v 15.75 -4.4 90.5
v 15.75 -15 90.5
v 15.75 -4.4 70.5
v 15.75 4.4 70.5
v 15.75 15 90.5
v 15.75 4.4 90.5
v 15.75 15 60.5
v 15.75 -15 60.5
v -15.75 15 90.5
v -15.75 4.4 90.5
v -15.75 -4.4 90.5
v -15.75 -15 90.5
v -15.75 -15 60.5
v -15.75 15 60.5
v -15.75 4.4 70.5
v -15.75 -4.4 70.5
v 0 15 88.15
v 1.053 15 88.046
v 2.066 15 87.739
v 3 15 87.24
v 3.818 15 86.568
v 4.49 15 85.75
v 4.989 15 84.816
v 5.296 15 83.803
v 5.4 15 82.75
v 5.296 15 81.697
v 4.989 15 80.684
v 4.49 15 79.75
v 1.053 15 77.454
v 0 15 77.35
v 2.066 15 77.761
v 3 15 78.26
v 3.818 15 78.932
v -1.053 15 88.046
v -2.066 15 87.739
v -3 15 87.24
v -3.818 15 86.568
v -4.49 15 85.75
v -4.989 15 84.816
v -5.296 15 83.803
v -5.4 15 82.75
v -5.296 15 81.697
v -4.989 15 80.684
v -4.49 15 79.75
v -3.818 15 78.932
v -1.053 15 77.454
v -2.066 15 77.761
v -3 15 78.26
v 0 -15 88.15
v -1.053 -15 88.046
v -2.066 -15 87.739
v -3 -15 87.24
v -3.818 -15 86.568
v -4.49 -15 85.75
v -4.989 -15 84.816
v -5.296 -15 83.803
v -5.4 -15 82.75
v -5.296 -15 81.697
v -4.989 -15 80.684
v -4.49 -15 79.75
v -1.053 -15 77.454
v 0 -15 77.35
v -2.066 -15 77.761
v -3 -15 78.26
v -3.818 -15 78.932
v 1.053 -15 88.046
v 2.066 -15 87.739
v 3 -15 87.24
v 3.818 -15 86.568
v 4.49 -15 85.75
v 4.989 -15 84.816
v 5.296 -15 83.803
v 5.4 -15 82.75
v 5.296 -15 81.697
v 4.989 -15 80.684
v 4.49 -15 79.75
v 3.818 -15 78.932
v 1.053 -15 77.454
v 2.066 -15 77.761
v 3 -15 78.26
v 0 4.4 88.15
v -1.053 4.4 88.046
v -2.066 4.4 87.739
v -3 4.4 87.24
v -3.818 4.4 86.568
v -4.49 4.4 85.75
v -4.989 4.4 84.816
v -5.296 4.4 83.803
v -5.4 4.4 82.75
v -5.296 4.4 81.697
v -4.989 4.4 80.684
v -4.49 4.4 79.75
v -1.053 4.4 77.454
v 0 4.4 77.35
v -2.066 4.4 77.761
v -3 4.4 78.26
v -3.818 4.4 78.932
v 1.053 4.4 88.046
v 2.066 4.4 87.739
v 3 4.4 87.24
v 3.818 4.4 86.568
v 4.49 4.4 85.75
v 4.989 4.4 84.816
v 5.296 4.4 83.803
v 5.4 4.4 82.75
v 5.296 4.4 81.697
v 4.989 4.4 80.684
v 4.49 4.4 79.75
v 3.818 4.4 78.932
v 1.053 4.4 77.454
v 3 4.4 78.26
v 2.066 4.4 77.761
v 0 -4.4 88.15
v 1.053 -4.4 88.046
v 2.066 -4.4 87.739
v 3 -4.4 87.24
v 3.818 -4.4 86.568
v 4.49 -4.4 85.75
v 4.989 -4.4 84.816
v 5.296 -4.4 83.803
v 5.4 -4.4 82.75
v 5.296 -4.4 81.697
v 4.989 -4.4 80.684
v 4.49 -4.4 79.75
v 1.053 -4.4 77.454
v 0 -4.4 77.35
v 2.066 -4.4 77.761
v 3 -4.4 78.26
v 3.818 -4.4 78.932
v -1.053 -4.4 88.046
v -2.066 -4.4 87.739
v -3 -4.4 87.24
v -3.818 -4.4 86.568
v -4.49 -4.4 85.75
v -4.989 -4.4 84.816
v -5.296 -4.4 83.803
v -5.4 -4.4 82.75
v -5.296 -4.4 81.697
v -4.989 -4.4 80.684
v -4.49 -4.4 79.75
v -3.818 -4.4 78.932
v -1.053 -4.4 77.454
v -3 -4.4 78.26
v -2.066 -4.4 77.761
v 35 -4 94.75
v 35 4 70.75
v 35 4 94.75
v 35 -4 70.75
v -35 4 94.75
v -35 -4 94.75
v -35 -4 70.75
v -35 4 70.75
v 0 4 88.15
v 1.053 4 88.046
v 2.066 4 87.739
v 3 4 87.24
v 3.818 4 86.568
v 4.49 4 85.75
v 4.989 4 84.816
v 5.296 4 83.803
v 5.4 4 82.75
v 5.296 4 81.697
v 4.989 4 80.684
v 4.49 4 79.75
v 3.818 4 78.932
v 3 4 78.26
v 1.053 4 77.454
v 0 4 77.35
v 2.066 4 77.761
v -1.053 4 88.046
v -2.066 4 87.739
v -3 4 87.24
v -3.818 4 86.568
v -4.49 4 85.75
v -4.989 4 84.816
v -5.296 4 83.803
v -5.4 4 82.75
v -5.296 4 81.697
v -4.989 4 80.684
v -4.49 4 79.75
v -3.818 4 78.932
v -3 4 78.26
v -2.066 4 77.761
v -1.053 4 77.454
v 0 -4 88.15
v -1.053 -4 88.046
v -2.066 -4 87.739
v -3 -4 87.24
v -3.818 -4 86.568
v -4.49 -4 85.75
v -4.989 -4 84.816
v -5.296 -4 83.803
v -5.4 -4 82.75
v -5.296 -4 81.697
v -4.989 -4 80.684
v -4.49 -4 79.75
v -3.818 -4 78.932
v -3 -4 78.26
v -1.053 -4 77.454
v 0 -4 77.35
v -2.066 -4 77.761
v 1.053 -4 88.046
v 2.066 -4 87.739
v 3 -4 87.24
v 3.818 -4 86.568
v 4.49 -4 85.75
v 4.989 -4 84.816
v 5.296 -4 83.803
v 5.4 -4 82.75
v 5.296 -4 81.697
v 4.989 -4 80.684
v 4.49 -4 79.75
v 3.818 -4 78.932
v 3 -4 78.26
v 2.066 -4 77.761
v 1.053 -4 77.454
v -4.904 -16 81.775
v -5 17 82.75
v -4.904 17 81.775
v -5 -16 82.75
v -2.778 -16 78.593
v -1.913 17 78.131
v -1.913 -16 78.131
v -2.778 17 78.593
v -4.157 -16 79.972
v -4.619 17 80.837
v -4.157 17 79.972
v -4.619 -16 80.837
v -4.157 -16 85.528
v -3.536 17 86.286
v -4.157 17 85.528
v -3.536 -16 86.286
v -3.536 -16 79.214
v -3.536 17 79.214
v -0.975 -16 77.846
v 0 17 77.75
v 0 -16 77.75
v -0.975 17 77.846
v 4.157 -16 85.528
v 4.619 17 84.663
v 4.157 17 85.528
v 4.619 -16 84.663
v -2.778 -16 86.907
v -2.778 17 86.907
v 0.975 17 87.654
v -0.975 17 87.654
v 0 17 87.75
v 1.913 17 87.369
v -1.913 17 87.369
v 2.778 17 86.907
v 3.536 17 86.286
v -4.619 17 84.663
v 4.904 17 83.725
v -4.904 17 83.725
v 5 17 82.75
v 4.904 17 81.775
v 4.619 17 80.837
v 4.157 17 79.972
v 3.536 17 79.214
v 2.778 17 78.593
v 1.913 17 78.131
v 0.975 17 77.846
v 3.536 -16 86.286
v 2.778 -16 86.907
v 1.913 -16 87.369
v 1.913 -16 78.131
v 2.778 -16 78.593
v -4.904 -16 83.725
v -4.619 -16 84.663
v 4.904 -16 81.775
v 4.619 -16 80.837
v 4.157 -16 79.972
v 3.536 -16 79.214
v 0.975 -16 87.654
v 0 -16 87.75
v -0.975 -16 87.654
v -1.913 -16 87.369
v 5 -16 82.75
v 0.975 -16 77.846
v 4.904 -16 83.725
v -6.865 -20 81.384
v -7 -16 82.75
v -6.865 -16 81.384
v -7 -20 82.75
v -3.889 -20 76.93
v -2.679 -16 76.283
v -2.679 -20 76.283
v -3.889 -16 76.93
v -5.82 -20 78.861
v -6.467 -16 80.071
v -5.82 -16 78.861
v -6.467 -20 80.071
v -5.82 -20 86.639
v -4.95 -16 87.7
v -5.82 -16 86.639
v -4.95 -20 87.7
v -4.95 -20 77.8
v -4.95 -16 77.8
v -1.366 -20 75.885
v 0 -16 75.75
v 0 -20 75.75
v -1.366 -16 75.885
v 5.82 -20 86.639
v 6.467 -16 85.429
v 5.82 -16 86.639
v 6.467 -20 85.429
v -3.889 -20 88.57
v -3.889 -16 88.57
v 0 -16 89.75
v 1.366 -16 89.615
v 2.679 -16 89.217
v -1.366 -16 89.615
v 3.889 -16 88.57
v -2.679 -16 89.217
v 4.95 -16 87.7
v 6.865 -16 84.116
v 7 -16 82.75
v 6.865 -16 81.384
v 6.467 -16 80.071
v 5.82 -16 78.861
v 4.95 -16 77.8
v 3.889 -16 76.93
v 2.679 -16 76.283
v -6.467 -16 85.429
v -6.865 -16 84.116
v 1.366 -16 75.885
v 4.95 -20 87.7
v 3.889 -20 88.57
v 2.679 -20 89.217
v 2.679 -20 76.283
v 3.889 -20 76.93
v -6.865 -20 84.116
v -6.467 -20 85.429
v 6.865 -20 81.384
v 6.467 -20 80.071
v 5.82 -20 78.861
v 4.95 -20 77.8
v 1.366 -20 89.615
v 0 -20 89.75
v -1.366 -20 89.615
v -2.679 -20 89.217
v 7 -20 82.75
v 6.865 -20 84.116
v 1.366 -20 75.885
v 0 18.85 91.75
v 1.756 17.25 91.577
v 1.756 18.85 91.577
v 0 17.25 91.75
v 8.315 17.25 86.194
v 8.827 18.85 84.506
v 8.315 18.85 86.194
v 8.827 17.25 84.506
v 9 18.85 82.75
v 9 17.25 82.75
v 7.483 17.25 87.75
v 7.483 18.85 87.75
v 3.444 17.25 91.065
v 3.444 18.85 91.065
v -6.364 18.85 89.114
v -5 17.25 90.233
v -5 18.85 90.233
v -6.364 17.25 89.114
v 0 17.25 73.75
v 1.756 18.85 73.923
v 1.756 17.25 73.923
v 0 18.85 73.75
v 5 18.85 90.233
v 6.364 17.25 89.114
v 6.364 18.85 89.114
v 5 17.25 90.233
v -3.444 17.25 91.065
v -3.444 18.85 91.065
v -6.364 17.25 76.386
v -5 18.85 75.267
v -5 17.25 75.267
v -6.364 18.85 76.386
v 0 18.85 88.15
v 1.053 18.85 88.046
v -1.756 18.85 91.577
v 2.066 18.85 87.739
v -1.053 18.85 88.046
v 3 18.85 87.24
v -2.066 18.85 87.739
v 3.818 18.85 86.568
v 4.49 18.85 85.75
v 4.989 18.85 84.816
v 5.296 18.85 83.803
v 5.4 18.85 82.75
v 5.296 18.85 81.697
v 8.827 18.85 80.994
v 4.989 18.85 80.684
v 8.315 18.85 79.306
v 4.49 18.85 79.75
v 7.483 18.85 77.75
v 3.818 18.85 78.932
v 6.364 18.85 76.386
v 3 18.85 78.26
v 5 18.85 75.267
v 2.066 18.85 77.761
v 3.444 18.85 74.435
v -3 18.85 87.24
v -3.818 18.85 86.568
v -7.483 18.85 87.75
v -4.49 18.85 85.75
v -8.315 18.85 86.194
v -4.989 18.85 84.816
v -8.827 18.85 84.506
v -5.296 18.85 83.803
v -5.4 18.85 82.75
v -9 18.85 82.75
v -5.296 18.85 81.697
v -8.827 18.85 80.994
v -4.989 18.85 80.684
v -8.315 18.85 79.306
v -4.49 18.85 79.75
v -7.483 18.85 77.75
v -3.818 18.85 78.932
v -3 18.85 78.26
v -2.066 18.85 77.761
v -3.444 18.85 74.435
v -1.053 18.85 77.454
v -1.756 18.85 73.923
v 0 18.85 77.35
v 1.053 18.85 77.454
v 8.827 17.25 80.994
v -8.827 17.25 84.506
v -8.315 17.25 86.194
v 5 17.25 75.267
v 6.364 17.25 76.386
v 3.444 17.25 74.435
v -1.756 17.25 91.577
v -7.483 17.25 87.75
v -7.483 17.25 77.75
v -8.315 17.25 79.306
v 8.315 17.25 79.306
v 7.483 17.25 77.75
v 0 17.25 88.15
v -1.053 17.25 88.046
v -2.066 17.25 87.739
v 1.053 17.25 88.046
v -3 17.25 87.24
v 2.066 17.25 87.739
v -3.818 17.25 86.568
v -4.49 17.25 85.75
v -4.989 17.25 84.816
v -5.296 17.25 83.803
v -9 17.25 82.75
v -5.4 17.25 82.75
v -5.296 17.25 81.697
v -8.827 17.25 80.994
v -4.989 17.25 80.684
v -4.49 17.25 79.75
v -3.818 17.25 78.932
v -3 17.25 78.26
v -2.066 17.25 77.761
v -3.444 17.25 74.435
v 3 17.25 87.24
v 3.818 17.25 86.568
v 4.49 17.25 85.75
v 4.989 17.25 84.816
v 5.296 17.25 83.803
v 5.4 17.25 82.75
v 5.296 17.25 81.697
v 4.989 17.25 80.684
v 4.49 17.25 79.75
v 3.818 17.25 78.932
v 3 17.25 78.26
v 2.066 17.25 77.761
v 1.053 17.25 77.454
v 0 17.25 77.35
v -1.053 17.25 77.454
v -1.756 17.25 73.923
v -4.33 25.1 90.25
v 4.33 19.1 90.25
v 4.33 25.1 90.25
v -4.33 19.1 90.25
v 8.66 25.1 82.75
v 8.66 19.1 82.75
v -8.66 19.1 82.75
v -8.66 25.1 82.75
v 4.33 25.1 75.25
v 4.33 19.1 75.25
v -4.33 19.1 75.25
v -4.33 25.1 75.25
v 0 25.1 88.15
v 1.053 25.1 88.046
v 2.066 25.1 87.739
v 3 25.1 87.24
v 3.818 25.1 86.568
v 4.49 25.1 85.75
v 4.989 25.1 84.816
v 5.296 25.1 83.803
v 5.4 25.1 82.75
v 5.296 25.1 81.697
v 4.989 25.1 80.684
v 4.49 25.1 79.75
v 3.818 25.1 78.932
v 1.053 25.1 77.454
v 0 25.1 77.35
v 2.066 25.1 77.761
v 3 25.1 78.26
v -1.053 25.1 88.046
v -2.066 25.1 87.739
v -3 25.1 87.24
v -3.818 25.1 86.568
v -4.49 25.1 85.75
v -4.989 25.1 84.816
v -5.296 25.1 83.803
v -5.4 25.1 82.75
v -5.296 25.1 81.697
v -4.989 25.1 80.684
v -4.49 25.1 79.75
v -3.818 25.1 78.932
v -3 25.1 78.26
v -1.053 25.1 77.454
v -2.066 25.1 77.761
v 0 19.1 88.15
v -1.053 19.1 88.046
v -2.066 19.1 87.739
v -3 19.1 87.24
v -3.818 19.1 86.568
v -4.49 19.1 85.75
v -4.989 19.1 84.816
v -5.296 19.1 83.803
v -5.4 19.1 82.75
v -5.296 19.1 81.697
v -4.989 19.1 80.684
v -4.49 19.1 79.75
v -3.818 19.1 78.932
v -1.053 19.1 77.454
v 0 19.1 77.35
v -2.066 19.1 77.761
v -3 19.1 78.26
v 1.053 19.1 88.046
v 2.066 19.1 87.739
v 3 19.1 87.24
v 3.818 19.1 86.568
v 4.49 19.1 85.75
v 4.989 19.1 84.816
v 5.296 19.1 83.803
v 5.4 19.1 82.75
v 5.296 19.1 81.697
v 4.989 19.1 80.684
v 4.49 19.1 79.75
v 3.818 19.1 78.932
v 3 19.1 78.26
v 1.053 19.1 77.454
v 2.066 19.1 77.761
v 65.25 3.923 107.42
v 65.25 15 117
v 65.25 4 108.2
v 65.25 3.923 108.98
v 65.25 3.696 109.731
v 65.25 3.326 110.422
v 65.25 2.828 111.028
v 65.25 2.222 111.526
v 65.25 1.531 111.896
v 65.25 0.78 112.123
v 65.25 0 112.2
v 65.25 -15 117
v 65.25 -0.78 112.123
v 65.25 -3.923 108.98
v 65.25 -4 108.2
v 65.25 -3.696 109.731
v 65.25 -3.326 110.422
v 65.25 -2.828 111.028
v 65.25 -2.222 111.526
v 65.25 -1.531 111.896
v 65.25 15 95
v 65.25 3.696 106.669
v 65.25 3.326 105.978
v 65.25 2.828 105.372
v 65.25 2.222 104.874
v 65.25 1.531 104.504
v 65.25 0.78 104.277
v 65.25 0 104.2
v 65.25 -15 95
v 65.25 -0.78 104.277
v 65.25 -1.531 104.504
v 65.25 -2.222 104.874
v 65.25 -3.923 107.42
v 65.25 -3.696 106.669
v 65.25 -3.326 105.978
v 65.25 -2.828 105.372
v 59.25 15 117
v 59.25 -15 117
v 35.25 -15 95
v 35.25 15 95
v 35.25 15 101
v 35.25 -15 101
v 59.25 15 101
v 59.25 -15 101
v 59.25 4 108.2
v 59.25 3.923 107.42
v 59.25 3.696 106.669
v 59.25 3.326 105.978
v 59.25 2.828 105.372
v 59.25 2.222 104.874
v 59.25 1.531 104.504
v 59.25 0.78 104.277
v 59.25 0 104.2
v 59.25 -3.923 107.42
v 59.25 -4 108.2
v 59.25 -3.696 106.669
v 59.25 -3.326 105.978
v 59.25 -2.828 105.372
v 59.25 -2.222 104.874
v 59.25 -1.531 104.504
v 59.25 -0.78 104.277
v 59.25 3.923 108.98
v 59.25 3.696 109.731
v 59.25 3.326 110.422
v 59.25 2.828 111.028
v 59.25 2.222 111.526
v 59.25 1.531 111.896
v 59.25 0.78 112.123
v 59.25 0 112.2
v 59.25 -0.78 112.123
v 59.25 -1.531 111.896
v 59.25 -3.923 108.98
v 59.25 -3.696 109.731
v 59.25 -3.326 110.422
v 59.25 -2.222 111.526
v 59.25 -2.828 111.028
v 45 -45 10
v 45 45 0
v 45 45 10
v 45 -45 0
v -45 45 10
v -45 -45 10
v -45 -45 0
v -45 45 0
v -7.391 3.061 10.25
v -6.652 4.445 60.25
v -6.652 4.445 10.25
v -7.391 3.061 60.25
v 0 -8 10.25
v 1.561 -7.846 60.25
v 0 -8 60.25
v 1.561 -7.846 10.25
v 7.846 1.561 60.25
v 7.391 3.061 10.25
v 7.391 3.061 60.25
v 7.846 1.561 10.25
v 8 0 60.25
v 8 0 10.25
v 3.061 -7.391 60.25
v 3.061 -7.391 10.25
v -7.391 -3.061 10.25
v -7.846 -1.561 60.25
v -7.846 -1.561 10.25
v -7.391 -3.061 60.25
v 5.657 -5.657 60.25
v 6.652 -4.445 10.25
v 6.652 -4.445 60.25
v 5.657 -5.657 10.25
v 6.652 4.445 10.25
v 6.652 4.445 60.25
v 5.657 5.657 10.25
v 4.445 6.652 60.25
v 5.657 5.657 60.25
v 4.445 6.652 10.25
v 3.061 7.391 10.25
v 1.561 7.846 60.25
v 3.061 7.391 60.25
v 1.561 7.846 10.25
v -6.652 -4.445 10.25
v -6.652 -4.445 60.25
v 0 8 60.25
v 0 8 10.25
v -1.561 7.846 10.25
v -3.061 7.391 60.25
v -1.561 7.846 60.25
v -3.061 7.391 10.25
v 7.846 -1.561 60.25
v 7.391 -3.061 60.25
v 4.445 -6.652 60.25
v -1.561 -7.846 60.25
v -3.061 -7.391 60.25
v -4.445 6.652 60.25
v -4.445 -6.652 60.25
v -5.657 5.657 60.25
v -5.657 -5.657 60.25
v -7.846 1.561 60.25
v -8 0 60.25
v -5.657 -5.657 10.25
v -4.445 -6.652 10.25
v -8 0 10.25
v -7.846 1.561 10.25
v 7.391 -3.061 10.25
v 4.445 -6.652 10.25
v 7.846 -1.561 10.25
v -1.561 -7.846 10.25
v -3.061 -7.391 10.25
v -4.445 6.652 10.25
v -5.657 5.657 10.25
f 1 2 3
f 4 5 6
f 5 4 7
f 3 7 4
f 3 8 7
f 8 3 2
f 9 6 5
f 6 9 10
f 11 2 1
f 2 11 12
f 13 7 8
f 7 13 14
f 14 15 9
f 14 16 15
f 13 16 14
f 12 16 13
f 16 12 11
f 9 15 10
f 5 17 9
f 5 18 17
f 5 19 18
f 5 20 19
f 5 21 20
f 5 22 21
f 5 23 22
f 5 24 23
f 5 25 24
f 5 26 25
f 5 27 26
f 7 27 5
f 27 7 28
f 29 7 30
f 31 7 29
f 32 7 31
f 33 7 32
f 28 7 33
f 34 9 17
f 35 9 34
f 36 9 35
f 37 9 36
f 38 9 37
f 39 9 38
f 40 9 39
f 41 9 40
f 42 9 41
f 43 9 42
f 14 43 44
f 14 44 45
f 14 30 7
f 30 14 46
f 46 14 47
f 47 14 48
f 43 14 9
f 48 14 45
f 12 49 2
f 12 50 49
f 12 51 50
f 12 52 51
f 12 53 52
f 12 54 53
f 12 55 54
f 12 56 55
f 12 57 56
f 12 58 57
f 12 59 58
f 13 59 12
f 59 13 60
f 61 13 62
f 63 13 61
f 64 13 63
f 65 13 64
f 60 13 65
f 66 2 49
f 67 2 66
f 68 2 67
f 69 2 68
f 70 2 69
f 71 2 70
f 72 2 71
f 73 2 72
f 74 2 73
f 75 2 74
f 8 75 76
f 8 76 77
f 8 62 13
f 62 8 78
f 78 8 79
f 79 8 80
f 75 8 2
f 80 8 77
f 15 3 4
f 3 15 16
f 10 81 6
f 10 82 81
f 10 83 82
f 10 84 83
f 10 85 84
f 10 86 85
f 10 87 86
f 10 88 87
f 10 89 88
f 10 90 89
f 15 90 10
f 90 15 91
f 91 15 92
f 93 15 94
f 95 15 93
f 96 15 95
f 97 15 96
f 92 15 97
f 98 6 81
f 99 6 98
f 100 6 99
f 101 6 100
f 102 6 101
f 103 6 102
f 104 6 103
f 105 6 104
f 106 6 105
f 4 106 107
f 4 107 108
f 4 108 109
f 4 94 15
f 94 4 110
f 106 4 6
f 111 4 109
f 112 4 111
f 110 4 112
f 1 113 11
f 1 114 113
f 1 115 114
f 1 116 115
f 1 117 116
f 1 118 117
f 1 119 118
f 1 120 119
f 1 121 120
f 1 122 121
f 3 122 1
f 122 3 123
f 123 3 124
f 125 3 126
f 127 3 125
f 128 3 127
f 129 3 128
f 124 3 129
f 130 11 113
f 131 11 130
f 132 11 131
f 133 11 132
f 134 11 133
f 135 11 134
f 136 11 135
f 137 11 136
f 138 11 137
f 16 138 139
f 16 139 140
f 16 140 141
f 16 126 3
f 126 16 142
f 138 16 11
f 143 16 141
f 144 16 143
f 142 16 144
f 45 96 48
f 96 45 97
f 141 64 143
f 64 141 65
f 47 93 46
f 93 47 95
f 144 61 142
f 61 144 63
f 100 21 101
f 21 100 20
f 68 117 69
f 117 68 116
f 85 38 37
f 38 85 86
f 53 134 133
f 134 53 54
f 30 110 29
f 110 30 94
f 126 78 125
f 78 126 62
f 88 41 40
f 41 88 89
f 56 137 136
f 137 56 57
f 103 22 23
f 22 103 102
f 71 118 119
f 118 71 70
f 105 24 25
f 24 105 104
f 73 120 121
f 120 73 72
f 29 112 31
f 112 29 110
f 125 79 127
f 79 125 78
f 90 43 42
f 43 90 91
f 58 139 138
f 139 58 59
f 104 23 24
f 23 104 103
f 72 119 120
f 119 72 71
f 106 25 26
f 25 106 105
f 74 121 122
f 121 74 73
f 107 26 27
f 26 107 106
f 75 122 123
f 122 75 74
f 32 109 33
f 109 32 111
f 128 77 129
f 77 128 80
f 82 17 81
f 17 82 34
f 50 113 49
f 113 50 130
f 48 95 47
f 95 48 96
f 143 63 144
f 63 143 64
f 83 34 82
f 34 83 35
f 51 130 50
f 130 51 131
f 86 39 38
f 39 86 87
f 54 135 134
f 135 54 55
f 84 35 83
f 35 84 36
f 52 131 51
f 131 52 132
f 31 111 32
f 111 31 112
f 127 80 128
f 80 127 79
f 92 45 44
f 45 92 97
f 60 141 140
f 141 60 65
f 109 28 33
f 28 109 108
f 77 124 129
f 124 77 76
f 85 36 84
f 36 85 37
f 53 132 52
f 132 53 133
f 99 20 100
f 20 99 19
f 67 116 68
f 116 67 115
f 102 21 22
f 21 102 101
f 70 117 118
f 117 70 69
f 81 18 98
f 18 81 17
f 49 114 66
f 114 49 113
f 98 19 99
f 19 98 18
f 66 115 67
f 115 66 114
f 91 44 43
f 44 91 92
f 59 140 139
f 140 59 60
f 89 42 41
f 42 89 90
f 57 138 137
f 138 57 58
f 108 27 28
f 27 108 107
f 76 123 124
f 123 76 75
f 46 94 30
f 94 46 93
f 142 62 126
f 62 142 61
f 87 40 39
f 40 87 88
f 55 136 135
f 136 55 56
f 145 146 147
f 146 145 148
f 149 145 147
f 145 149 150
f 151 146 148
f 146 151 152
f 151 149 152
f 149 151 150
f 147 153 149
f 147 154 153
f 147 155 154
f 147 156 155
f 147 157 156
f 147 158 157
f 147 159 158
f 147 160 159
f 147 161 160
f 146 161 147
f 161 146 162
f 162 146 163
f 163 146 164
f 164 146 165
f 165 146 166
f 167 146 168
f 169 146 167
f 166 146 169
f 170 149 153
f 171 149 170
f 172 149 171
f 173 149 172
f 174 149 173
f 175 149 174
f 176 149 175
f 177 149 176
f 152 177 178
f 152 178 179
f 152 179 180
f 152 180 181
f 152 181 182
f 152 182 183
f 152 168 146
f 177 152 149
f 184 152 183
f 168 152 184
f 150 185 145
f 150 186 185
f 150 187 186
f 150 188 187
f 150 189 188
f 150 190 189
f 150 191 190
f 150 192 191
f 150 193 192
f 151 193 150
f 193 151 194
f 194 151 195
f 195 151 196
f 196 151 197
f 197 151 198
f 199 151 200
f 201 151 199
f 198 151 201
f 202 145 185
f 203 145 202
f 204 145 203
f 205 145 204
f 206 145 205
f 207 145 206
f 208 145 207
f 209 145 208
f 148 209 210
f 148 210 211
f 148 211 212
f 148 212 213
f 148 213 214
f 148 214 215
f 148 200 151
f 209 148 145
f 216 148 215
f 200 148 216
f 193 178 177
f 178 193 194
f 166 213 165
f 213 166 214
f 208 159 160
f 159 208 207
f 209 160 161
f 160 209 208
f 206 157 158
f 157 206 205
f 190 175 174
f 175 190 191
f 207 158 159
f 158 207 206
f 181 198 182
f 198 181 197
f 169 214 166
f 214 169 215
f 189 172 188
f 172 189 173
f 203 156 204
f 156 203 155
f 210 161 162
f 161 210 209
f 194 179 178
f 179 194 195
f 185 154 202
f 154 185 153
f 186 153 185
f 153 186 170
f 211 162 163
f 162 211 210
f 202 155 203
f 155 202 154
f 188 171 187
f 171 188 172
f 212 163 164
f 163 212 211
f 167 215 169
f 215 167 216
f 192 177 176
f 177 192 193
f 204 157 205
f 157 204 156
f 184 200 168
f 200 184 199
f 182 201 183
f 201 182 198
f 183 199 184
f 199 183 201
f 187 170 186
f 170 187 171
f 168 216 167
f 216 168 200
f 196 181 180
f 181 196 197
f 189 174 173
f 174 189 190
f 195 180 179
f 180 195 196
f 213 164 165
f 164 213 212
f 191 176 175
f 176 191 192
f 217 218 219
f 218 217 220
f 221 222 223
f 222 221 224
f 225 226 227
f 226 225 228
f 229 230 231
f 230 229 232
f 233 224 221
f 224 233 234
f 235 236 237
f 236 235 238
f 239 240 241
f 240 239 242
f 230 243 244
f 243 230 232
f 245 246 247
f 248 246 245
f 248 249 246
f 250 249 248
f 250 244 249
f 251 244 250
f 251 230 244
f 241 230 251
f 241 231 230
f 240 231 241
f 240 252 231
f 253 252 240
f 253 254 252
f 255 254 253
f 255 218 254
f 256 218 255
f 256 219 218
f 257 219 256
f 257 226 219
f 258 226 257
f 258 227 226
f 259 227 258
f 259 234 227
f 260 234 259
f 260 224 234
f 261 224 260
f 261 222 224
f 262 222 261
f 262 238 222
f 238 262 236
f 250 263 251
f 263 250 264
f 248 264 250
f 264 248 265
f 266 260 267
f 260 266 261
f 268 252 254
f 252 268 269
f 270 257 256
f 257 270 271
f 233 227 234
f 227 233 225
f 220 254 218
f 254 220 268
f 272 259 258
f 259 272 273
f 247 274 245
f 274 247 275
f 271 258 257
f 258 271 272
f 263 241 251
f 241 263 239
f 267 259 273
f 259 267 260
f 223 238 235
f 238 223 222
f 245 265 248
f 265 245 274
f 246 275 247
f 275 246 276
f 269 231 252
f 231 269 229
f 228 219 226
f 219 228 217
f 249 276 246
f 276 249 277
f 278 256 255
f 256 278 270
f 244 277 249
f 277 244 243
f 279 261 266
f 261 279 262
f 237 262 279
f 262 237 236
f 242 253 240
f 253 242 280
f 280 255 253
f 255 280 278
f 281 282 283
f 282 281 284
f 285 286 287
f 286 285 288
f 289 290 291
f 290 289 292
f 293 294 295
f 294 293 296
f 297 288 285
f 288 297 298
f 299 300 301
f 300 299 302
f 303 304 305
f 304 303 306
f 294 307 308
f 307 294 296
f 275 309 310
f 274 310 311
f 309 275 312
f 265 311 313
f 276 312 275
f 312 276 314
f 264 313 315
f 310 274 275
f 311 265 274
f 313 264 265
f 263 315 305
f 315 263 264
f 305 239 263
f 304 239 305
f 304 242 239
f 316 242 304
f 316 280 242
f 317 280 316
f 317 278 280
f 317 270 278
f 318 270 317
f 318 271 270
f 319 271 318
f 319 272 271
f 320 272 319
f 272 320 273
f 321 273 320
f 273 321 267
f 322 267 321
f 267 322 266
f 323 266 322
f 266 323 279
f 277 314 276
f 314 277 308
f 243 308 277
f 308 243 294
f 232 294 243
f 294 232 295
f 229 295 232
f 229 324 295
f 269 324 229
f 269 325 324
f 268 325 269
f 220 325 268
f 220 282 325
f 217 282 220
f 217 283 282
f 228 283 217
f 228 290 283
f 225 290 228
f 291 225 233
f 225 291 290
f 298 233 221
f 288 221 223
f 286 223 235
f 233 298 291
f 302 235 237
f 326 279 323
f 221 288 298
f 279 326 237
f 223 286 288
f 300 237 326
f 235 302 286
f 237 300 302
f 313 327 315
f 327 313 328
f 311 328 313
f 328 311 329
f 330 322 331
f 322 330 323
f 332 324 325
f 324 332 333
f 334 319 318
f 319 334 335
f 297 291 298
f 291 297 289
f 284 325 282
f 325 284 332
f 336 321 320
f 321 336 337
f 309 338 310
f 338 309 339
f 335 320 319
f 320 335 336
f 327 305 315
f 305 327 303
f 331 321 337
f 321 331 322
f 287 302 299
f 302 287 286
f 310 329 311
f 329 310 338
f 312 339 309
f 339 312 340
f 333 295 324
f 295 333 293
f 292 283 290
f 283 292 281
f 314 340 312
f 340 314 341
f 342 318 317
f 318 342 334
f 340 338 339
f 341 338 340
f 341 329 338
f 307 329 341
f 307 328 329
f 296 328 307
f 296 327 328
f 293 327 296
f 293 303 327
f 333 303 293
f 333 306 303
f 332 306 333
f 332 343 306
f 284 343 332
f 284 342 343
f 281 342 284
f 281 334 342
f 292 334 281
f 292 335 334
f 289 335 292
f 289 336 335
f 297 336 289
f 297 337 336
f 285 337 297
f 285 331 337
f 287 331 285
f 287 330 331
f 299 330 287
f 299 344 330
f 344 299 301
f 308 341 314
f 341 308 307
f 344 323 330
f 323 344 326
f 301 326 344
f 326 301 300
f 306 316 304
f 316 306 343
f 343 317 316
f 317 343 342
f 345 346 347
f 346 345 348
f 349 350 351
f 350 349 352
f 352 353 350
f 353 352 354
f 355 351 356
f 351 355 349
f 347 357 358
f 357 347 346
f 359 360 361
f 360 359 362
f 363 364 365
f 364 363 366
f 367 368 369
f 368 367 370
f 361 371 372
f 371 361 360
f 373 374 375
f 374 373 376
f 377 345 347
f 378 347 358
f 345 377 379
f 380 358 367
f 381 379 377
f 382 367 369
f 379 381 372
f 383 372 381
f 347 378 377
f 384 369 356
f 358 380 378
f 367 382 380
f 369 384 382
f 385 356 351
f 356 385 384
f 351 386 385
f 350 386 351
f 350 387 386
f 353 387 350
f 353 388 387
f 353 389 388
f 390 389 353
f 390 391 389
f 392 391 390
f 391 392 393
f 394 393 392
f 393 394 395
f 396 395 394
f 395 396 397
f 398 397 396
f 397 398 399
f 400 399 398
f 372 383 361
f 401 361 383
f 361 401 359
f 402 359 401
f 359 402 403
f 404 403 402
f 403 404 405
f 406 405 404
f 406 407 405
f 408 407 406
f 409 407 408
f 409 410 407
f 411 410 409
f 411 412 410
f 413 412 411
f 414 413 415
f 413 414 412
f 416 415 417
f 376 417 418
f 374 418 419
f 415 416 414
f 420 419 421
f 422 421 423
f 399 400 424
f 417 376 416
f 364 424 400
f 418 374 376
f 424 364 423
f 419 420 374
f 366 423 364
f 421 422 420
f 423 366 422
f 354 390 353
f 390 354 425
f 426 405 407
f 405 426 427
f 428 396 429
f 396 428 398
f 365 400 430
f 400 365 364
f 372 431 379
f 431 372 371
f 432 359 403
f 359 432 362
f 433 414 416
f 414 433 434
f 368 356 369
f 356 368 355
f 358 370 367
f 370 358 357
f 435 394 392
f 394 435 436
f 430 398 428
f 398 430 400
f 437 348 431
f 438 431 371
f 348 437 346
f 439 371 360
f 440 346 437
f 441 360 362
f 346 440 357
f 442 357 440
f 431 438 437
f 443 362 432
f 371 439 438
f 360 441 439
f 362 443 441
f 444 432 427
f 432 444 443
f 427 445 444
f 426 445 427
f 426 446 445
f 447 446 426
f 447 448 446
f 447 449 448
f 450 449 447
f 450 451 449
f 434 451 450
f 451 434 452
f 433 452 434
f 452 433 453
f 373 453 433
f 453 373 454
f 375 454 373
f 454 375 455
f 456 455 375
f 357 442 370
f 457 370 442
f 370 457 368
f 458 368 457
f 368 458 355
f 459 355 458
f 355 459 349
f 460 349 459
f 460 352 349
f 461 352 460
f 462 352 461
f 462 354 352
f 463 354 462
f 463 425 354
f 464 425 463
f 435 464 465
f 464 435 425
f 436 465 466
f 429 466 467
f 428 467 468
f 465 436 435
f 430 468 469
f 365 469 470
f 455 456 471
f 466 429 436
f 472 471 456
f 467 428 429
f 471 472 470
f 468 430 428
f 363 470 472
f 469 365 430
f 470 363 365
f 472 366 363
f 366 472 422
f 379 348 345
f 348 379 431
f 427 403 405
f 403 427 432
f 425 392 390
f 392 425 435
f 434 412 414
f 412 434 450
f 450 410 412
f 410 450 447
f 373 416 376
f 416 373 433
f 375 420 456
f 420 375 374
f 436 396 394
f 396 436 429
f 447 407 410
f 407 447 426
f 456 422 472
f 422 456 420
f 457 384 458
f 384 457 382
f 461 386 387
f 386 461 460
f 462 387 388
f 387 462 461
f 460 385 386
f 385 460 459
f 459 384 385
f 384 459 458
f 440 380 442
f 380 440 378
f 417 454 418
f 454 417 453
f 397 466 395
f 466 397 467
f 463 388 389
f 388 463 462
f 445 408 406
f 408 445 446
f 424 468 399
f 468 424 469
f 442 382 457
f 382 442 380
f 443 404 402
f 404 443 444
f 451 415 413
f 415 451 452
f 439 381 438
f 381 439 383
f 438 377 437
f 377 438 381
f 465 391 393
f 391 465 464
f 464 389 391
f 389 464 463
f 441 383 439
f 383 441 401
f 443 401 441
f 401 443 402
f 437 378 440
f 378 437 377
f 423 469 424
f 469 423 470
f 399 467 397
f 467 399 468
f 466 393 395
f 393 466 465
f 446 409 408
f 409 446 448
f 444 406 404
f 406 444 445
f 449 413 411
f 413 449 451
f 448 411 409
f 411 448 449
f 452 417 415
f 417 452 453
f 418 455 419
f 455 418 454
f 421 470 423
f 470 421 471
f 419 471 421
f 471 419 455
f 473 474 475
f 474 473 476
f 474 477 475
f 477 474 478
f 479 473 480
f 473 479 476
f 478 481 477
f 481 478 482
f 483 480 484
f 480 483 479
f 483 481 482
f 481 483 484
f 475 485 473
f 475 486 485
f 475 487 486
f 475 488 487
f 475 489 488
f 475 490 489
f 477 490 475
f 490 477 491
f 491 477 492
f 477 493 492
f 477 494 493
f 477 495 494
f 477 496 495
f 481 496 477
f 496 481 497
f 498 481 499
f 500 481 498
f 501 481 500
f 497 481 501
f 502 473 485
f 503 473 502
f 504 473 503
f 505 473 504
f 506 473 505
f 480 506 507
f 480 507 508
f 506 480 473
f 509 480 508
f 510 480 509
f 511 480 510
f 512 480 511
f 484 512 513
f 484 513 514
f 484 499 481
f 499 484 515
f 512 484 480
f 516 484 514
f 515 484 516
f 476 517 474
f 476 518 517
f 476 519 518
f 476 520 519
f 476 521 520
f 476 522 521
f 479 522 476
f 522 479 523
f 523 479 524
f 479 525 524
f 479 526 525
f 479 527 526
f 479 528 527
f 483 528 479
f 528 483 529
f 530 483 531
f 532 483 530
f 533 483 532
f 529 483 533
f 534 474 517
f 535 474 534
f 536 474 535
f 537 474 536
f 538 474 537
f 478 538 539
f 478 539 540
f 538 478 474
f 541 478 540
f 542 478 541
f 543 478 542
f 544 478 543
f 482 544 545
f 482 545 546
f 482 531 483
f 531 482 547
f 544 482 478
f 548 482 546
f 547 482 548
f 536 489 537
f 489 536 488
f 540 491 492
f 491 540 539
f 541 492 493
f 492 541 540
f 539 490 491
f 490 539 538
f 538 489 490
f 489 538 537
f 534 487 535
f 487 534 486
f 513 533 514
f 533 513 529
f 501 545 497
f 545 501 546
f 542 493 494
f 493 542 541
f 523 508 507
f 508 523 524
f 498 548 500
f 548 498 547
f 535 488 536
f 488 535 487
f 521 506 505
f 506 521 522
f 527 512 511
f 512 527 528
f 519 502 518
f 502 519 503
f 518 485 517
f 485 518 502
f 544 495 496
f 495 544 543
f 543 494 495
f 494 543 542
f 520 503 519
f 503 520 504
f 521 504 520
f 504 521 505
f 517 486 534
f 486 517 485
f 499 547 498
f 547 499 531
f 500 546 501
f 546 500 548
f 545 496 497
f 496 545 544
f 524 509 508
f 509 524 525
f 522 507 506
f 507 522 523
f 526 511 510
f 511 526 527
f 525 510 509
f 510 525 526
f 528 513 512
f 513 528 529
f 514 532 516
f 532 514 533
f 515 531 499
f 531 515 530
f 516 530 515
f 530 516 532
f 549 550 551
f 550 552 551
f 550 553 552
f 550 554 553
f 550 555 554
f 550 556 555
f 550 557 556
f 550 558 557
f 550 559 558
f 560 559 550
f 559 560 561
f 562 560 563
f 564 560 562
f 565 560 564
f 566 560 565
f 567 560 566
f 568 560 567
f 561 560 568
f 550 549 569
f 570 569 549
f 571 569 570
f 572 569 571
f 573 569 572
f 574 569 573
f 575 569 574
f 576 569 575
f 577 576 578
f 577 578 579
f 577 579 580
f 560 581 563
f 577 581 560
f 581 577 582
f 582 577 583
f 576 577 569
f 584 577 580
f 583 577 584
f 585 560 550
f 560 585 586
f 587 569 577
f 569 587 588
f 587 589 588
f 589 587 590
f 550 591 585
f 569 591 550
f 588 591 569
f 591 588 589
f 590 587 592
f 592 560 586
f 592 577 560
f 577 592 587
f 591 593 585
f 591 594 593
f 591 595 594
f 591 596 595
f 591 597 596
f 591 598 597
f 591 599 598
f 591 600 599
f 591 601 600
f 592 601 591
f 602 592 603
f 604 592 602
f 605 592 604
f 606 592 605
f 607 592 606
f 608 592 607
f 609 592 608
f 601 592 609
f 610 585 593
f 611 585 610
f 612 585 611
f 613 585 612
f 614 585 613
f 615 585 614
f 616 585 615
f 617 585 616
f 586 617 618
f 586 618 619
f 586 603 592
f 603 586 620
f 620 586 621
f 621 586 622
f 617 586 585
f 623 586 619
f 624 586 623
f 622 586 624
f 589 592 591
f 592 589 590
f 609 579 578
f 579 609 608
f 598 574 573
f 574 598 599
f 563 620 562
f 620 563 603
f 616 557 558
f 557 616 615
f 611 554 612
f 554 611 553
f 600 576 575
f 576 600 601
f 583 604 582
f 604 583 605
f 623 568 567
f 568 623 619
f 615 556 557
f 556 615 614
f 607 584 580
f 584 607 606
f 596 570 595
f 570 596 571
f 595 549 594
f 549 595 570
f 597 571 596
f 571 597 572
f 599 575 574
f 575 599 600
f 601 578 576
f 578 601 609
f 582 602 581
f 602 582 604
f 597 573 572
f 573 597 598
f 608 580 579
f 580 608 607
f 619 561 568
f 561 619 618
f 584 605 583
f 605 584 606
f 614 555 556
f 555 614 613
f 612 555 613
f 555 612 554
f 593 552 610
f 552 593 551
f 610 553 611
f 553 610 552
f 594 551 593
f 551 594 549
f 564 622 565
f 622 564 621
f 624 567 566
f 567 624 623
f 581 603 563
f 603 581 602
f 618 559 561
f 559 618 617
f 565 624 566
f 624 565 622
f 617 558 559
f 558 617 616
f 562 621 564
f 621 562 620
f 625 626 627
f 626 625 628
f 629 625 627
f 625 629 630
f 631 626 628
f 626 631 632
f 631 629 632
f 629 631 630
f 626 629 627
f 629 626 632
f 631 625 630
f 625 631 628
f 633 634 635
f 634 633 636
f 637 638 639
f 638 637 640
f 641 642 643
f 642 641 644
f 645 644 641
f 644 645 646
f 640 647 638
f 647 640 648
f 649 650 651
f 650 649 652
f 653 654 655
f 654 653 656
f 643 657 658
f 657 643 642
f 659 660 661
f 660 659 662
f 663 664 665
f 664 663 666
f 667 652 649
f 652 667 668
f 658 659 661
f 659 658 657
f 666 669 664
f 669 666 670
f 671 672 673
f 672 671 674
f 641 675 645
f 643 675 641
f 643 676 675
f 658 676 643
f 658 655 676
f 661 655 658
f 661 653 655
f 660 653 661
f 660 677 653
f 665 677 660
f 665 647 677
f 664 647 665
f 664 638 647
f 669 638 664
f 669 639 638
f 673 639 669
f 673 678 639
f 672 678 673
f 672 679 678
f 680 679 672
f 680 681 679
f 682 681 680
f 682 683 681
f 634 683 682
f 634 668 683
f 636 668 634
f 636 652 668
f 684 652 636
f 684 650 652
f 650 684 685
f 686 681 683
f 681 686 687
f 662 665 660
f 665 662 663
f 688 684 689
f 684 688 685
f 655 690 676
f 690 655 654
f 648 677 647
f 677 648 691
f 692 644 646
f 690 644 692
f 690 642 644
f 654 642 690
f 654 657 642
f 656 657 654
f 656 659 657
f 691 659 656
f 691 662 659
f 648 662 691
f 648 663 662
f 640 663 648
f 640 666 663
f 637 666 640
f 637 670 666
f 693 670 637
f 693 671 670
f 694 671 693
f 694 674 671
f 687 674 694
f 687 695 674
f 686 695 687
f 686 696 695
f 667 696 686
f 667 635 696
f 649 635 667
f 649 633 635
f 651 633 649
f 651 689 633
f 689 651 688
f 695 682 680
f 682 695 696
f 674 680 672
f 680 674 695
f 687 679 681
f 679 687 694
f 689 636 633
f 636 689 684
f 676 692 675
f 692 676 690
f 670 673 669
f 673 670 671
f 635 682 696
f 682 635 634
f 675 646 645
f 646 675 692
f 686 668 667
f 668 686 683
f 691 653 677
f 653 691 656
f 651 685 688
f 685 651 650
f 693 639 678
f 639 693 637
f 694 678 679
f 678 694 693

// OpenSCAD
$fn = 32;

// ------------------------------------------------------------------------
// Lamp arm: column d16 x 50 mm, arm 70 mm
// Every part is its own module, assembly() places every instance.
// ------------------------------------------------------------------------

// --- part 1 ---
module lamp_base() {
  difference() {
    translate([-45, -45, 0]) cube([90, 90, 10]);
  }
}

// --- part 2 ---
module lamp_column() {
  cylinder(h = 50, d = 16);
}

// --- part 3 ---
module head_fork() {
  difference() {
    translate([-15.75, -15, 0]) cube([31.5, 30, 30]);
    translate([-16.75, -4.4, 10]) cube([33.5, 8.8, 21]);
    translate([0, 0, 22.25]) rotate([90, 0, 0]) cylinder(h = 32, d = 10.8, center = true);
  }
}

// --- part 4 ---
module lamp_arm() {
  difference() {
    translate([-35, -4, 0]) cube([70, 8, 24]);
    translate([0, 0, 12]) rotate([90, 0, 0]) cylinder(h = 10, d = 10.8, center = true);
  }
}

// --- part 5 ---
module arm_pin() {
  rotate([0, 90, 0]) cylinder(h = 34, d = 10, center = true);
  translate([-20, 0, 0]) rotate([0, 90, 0]) cylinder(h = 4, d = 14);
}

// --- part 6 ---
module arm_washer() {
  difference() {
      translate([0, 0, 0]) cylinder(h = 1.6, d = 18);
      translate([0, 0, -1]) cylinder(h = 3.6, d = 10.8);
    }
}

// --- part 7 ---
module arm_nut() {
  difference() {
    linear_extrude(height = 6) polygon(points = [[8.66, 0], [4.33, 7.5], [-4.33, 7.5], [-8.66, 0], [-4.33, -7.5], [4.33, -7.5]]);
    translate([0, 0, -1]) cylinder(h = 8, d = 10.8);
  }
}

// --- part 8 ---
module shade_bracket() {
  difference() {
    translate([-15, -15, 0]) cube([30, 30, 22]);
    translate([-16, -16, 6]) cube([25, 32, 17]);
    translate([12, 0, 13.2]) rotate([0, 90, 0]) cylinder(h = 8, d = 8, center = true);
  }
}

// --- assembly ---
module assembly() {
  color([0.80, 0.24, 0.20]) translate([0, 0, 0]) rotate([0, 0, 0]) lamp_base();
  color([0.20, 0.45, 0.75]) translate([0, 0, 10.25]) rotate([0, 0, 0]) lamp_column();
  color([0.25, 0.62, 0.32]) translate([0, 0, 60.5]) rotate([0, 0, 0]) head_fork();
  color([0.92, 0.70, 0.18]) translate([0, 0, 70.75]) rotate([0, 0, 0]) lamp_arm();
  color([0.58, 0.35, 0.70]) translate([0, 0, 82.75]) rotate([0, 0, 90]) arm_pin();
  color([0.16, 0.66, 0.66]) translate([0, 18.85, 82.75]) rotate([90, 0, 0]) arm_washer();
  color([0.85, 0.48, 0.18]) translate([0, 25.1, 82.75]) rotate([90, 0, 0]) arm_nut();
  color([0.55, 0.60, 0.65]) translate([50.25, 0, 95]) rotate([0, 0, 0]) shade_bracket();
}

assembly();
